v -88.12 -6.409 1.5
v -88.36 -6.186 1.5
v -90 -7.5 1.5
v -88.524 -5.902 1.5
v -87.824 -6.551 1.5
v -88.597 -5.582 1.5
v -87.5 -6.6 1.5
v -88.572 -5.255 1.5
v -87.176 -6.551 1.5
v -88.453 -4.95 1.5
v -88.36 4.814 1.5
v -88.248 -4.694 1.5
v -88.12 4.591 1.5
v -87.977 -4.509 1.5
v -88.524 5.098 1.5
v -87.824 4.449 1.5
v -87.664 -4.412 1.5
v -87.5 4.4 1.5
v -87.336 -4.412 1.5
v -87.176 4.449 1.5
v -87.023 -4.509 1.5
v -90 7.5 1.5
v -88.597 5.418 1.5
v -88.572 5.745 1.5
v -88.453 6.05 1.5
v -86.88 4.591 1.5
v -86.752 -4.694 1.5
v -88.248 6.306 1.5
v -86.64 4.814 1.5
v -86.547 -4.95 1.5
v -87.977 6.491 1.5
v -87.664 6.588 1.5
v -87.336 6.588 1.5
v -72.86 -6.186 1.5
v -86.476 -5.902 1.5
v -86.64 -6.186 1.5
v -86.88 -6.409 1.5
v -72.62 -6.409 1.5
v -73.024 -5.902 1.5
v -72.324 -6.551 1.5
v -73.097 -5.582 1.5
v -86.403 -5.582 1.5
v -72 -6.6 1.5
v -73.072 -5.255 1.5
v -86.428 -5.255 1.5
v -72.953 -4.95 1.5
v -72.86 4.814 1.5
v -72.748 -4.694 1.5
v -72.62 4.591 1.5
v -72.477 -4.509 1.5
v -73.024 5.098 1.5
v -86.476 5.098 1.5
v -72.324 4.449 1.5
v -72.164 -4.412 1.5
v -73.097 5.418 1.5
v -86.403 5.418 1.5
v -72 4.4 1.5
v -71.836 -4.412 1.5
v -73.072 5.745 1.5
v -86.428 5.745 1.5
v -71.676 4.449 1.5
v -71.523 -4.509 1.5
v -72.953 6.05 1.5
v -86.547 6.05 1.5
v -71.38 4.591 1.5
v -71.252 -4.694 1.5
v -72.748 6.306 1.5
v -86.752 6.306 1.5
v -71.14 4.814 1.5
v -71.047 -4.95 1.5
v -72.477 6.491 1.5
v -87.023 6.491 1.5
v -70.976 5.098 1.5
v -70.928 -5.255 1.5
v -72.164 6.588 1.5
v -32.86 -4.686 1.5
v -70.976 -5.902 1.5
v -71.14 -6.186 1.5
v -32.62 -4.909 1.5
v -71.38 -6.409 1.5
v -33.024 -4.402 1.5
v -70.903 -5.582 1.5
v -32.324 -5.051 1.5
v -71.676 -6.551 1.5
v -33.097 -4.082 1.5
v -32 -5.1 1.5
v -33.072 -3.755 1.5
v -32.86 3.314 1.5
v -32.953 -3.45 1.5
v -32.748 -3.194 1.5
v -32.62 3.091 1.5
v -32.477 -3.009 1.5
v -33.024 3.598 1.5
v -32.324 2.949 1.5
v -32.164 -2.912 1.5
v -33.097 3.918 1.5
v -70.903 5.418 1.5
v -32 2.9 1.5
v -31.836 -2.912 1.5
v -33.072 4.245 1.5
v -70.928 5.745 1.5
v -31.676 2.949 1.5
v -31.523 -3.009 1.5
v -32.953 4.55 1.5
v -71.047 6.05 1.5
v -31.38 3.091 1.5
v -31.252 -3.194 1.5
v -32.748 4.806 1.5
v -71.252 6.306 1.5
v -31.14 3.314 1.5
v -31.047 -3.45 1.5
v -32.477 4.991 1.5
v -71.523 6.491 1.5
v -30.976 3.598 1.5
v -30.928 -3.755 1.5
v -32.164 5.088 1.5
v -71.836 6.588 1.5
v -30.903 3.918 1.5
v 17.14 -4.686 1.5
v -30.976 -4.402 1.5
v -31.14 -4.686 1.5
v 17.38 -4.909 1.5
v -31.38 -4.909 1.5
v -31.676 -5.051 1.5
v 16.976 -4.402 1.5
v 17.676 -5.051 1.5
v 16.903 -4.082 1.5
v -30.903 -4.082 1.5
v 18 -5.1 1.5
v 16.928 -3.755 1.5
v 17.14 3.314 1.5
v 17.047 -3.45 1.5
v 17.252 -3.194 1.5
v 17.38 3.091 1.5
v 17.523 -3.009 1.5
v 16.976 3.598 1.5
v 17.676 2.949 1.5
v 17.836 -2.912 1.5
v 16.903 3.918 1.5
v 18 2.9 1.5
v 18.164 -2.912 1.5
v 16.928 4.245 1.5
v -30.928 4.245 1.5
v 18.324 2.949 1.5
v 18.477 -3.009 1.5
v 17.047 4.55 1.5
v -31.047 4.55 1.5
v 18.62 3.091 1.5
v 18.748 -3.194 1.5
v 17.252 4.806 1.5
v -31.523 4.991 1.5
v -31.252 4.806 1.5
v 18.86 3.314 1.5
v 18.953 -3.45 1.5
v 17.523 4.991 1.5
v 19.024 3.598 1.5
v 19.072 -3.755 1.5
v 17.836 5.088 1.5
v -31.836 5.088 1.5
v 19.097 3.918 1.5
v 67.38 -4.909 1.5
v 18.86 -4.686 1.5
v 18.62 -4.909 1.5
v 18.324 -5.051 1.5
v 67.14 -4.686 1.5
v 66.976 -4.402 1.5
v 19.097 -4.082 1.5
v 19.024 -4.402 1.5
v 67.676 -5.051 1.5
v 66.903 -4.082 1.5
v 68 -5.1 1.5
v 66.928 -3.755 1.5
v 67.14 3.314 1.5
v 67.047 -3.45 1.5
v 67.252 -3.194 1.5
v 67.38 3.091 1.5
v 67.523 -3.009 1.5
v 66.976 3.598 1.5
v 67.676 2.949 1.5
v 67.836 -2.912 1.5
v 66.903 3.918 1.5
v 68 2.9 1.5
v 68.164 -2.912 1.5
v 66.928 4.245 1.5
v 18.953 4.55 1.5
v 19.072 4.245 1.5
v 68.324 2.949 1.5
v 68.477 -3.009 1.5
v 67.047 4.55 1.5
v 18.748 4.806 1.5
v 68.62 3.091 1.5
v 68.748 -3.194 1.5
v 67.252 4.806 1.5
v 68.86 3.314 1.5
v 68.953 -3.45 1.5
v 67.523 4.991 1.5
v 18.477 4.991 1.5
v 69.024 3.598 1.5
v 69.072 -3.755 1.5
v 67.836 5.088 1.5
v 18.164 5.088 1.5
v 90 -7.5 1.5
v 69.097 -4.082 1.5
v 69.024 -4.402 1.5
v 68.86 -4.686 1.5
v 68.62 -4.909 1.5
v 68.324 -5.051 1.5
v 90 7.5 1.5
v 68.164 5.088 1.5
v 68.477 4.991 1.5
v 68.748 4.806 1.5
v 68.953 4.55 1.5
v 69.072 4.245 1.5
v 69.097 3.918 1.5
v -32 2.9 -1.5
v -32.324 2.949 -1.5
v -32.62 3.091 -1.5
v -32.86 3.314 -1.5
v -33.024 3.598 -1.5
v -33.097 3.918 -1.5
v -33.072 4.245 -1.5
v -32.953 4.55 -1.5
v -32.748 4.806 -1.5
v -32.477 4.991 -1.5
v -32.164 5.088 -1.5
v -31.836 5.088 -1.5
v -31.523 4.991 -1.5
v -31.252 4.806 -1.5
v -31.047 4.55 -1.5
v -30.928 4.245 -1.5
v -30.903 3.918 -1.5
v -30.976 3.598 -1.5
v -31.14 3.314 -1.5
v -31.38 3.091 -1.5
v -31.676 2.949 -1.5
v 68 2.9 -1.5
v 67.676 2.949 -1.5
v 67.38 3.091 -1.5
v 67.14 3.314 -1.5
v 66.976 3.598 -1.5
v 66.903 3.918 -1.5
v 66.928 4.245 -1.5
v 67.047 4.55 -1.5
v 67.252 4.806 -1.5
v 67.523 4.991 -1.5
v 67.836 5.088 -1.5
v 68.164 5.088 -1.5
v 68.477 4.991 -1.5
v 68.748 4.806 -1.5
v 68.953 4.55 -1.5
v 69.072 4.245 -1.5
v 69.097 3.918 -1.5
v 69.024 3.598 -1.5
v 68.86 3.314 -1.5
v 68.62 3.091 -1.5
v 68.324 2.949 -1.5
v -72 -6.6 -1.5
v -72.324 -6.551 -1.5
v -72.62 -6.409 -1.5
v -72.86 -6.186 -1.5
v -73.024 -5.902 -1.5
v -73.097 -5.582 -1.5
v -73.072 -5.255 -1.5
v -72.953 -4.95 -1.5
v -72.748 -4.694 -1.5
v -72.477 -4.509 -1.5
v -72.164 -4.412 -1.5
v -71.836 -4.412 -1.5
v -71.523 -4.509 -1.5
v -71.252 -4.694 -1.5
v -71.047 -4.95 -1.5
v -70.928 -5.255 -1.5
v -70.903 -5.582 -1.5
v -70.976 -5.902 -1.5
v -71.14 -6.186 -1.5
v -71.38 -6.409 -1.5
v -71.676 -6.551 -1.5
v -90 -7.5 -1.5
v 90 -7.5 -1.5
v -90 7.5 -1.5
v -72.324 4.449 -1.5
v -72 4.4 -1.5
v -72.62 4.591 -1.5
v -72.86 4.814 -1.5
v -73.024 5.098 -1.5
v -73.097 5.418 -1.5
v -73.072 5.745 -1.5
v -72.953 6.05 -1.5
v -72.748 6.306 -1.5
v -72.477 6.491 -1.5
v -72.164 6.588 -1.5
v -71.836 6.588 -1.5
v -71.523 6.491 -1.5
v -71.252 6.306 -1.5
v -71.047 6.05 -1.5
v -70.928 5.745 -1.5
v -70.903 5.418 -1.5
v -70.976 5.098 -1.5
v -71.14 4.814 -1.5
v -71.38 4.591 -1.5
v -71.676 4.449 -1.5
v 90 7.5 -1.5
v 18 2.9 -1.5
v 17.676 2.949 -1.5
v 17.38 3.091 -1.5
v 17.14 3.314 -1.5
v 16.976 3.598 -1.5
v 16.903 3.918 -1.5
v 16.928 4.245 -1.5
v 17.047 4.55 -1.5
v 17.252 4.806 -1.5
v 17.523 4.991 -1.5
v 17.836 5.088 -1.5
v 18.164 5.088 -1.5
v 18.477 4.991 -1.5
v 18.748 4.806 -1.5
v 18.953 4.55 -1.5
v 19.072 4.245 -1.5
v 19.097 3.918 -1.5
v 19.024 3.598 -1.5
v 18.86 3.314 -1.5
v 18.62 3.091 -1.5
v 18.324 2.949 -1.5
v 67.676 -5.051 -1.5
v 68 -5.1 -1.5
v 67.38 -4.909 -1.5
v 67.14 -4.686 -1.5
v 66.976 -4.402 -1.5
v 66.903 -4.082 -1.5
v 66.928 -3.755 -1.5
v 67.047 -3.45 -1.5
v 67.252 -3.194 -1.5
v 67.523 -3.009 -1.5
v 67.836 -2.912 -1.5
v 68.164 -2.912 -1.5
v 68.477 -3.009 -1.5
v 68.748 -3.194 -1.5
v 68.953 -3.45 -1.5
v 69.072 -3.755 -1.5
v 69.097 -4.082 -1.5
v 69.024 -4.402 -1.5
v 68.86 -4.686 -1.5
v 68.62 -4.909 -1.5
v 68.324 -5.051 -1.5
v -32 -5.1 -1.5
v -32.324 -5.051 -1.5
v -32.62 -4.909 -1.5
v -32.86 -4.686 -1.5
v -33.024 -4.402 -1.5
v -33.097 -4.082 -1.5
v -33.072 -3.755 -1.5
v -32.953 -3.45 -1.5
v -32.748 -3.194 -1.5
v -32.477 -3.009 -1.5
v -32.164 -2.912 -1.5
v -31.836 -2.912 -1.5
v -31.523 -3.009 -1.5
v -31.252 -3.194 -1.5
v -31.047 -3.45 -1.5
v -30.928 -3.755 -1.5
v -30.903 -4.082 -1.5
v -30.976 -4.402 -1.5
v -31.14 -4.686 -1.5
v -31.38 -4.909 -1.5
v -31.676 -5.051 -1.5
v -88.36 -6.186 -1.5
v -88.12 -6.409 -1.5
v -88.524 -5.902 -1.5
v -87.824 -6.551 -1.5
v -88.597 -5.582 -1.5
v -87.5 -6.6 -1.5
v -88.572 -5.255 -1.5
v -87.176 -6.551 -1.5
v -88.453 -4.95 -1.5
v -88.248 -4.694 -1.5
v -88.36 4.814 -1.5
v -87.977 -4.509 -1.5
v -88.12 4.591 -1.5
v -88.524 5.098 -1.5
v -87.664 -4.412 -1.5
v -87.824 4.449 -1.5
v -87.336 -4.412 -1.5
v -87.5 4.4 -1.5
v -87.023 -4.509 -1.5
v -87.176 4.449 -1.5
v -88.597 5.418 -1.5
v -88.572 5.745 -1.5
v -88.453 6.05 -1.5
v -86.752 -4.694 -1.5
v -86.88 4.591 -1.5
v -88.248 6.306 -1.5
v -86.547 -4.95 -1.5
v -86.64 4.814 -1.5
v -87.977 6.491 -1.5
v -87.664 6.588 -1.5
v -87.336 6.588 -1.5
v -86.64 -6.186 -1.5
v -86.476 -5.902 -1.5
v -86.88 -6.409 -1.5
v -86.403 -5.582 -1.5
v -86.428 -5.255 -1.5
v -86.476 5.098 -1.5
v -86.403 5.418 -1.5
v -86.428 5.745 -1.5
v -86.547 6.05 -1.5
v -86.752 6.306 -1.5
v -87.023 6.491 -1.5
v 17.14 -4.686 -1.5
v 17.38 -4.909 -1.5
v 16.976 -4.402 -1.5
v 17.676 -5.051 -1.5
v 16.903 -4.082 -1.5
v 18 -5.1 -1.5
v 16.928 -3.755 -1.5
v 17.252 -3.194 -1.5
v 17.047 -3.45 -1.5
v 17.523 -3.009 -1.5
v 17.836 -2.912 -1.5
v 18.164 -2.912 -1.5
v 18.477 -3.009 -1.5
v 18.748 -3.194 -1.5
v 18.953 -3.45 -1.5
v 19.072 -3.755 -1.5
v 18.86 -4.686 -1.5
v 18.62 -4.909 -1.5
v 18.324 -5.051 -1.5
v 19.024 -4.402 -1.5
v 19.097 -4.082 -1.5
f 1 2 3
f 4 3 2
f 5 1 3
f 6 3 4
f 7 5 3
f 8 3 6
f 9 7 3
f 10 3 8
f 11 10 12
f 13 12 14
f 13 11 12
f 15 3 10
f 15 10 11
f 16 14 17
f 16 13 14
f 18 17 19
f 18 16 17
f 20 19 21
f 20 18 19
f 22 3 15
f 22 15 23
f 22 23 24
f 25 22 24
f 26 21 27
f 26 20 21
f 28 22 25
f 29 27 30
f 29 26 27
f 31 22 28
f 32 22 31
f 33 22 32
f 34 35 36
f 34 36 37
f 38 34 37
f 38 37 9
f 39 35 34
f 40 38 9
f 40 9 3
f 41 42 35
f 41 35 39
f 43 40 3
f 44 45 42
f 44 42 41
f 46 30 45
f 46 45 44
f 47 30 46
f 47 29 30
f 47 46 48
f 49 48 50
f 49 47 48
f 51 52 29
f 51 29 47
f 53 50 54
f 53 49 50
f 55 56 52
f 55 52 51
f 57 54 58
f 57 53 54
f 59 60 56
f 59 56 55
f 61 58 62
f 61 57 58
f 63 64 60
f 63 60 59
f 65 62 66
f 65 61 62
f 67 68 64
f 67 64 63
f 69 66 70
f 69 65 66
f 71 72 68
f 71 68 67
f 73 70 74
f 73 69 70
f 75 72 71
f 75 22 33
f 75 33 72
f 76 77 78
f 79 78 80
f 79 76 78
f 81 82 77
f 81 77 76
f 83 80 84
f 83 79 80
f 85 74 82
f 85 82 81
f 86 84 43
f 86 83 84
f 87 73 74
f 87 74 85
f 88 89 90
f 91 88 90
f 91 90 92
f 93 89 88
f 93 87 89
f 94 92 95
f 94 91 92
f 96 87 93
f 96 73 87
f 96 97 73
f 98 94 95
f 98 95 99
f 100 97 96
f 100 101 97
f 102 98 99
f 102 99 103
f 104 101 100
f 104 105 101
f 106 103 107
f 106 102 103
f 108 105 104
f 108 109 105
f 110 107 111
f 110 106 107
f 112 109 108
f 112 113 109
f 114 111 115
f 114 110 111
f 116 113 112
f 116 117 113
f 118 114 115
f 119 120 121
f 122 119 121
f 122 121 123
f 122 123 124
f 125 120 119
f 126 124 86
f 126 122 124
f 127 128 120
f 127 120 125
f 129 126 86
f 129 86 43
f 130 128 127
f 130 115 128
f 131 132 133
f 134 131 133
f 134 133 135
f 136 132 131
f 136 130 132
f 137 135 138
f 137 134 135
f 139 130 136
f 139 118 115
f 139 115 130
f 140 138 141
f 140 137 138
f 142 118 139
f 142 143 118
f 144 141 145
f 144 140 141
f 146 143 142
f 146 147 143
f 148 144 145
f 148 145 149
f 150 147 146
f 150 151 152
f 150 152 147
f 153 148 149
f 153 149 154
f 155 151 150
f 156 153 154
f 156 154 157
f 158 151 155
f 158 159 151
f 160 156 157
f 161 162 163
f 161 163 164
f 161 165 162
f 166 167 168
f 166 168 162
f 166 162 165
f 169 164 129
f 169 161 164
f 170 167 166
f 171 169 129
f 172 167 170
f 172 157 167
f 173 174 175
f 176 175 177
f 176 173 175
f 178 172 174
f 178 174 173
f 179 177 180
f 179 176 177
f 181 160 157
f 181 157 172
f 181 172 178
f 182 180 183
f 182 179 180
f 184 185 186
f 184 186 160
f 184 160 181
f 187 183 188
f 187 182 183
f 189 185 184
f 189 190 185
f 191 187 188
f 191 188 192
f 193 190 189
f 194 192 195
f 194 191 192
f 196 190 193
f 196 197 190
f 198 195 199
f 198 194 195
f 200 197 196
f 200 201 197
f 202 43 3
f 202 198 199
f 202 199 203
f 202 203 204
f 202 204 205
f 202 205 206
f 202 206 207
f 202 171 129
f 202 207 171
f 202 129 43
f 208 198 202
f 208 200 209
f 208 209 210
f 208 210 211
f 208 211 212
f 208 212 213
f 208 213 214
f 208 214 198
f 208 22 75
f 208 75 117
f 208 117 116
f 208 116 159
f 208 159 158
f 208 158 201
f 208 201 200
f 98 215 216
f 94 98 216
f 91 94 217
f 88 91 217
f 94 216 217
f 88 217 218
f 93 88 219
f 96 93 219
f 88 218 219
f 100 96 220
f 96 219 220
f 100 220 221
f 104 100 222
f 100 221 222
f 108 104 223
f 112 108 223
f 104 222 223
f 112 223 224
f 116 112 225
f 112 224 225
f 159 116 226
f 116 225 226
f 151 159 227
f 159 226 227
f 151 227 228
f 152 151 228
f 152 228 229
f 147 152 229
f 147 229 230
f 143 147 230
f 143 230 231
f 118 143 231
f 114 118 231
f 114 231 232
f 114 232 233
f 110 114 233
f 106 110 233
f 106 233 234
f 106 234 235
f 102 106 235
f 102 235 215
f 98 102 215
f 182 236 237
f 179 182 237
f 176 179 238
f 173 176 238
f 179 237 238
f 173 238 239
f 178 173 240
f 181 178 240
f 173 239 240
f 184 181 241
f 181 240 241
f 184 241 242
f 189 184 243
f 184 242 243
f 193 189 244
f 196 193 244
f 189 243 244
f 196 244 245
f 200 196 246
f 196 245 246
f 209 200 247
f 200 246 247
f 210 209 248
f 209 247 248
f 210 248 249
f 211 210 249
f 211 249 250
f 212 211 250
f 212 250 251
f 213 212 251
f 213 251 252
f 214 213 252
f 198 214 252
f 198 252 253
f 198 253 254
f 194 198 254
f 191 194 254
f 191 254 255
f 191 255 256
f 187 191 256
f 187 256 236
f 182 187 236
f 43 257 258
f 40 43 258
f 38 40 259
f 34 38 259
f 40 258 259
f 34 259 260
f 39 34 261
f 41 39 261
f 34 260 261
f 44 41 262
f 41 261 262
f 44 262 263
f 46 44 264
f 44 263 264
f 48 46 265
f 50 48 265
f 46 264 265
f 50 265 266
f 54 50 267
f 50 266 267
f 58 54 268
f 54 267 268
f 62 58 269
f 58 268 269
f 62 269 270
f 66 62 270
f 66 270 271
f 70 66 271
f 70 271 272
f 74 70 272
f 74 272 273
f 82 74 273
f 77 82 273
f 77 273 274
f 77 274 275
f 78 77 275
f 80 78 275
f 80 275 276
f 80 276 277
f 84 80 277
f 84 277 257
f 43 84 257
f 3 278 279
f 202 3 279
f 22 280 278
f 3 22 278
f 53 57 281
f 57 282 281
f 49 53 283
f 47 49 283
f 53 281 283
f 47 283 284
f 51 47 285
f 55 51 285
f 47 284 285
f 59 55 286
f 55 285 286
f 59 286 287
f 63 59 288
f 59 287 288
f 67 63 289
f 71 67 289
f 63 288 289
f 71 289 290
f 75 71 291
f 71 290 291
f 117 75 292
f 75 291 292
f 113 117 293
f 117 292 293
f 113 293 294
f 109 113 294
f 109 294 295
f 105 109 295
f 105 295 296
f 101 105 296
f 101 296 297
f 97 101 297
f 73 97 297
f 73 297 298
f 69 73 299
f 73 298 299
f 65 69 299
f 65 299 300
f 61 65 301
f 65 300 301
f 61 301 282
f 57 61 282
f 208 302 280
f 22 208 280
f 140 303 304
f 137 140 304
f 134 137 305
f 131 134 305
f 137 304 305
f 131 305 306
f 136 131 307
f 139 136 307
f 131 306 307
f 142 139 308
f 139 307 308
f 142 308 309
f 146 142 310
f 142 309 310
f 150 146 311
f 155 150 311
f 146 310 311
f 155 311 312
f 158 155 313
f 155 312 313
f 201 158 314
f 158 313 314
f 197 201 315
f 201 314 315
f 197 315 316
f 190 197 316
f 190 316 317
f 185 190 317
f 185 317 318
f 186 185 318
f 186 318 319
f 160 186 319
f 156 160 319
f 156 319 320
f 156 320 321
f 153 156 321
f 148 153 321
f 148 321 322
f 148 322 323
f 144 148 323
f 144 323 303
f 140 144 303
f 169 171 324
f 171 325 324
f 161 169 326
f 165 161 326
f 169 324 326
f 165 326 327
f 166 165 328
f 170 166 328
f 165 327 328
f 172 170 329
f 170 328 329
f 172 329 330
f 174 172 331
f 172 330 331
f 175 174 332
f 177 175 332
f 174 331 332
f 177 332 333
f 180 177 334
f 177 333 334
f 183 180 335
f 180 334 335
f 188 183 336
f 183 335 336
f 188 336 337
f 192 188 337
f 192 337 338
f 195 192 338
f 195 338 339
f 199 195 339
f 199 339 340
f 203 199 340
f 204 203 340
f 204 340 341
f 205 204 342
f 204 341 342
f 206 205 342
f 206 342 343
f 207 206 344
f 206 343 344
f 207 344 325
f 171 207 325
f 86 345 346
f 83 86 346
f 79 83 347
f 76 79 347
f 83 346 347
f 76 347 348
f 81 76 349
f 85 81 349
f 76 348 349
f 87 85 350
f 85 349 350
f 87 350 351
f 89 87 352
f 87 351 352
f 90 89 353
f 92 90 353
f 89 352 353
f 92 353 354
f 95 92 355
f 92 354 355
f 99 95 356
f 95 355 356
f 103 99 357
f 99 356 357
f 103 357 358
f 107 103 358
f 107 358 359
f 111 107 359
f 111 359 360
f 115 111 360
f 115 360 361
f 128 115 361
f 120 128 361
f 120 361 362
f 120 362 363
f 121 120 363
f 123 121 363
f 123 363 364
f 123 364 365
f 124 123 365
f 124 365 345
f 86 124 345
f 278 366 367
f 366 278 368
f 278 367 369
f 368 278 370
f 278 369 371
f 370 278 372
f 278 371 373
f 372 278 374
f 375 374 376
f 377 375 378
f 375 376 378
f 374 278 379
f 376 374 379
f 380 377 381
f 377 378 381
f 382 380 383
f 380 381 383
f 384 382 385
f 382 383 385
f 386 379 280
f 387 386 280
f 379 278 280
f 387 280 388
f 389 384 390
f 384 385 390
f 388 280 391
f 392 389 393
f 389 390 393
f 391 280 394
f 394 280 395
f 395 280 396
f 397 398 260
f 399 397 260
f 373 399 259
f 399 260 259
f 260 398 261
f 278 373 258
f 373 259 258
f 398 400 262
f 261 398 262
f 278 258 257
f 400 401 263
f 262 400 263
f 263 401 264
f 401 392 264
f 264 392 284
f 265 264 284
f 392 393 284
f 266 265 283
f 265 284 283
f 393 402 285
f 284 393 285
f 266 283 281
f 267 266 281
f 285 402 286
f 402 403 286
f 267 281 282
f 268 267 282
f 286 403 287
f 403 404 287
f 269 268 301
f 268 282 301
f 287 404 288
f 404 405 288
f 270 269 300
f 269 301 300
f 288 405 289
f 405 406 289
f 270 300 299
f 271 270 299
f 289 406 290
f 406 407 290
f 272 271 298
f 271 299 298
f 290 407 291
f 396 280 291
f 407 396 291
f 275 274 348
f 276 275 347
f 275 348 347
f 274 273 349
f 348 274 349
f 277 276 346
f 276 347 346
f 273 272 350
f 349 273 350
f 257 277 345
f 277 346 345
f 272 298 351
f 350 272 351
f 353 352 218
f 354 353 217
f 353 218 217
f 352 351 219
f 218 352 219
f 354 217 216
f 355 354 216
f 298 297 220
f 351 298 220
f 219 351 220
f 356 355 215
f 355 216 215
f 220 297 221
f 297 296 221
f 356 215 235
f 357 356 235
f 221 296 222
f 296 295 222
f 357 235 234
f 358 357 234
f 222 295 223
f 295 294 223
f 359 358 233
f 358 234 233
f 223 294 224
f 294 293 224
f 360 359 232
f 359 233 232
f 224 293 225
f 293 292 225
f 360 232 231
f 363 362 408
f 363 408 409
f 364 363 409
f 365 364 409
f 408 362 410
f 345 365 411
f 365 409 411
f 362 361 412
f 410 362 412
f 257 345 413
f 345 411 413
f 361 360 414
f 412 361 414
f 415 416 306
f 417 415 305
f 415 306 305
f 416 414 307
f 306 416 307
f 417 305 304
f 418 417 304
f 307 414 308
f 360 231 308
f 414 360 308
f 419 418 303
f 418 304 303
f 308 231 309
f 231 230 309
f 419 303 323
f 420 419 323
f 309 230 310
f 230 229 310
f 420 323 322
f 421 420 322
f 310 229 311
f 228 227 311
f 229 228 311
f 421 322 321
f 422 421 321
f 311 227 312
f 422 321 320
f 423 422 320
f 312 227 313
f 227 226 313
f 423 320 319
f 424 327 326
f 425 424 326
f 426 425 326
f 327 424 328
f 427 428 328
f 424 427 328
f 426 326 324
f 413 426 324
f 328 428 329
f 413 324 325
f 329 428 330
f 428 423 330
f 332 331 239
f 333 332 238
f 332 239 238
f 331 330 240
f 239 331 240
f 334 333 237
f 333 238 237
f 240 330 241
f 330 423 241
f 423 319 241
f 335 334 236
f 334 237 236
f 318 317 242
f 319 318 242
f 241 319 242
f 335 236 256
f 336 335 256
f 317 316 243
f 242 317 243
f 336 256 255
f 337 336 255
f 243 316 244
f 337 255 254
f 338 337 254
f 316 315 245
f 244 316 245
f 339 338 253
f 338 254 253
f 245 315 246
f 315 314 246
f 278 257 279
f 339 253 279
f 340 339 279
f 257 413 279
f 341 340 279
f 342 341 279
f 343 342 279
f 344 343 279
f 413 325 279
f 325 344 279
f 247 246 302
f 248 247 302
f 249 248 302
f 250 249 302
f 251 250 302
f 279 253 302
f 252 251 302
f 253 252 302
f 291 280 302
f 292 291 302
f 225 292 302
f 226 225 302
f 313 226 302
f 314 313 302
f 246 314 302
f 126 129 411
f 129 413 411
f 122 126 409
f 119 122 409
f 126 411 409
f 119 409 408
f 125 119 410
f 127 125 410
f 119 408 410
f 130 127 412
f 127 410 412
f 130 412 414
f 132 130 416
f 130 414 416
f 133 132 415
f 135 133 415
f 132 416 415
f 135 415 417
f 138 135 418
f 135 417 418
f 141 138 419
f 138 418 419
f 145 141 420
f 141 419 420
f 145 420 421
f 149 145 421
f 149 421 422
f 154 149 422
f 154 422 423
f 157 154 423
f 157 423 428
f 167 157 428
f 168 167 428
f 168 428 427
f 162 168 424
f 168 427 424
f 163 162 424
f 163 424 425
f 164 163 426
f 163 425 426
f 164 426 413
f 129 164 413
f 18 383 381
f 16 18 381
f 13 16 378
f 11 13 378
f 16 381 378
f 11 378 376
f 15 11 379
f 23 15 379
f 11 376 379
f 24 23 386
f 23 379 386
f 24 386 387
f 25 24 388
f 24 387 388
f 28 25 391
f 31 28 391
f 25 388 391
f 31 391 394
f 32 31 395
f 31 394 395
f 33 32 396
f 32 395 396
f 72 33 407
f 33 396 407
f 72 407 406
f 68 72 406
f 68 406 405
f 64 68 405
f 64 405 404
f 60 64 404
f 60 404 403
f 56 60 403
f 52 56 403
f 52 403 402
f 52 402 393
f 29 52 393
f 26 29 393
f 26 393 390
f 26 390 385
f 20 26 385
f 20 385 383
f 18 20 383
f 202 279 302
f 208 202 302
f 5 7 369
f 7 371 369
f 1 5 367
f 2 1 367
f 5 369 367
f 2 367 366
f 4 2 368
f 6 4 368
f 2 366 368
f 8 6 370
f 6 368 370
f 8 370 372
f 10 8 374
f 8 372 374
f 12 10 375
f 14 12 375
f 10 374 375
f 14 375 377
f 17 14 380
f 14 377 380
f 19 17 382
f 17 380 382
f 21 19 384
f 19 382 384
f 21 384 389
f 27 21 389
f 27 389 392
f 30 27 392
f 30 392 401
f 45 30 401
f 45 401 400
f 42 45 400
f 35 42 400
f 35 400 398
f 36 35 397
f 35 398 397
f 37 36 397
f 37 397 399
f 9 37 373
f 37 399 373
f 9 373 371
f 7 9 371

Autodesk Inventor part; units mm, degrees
ref_plane "YZ Plane" through (0, 0, 0) normal (1, 0, 0) x (0, 1, 0)
ref_plane "XZ Plane" through (0, 0, 0) normal (0, 1, 0) x (-1, 0, 0)
ref_plane "XY Plane" through (0, 0, 0) normal (0, 0, 1) x (1, 0, 0)
sketch "スケッチ1" plane through (0, 0, 0) normal (0, 0, 1) x (1, 0, 0)
  line L0 (-90, -7.5) -> (90, -7.5)
  line L1 (90, -7.5) -> (90, 7.5)
  line L2 (90, 7.5) -> (-90, 7.5)
  line L3 (-90, 7.5) -> (-90, -7.5)
  line L4 (-90, -7.5) -> (90, 7.5) construction
  line L5 (90, -7.5) -> (-90, 7.5) construction
  point P0 (0, 0)
  dimension "d0" = 180
  dimension "d1" = 15
extrude "押し出し1" add sketch "スケッチ1" along normal mid plane 3
sketch "スケッチ2" plane through (0, 0, 1.5) normal (0, 0, 1) x (1, 0, 0)
  line L0 (-90, 7.5) -> (-90, -7.5) projected
  line L1 (0, 0) -> (-7.3146, 0)
  point P0 (-87.5, 5.5)
  point P1 (-72, 5.5)
  point P2 (-87.5, -5.5)
  point P3 (-72, -5.5)
  dimension "d4" = 2.5
  dimension "d5" = 15.5
  dimension "d6" = 5.5
  dimension "d7" = 5.5
hole "穴1" at (-87.5, 5.5, 1.5) at (-72, 5.5, 1.5) at (-87.5, -5.5, 1.5) at (-72, -5.5, 1.5) direction (0, 0, -1) diameter 2.2 end through all
sketch "スケッチ3" plane through (0, 0, 1.5) normal (0, 0, 1) x (1, 0, 0)
  circle A0 centre (-72, 5.5) radius 1.1 projected
  circle A1 centre (-72, -5.5) radius 1.1 projected
  circle A2 centre (-72, -5.5) radius 1.1 projected
  circle A3 centre (-87.5, -5.5) radius 1.1 projected
  circle A4 centre (-72, 5.5) radius 1.1 projected
  circle A5 centre (-87.5, 5.5) radius 1.1 projected
  line L0 (90, -7.5) -> (90, 7.5) projected
  line L1 (90, 7.5) -> (-90, 7.5) projected
  line L2 (-90, 7.5) -> (-90, -7.5) projected
  line L3 (-90, -7.5) -> (90, -7.5) projected
  point P0 (0, 0)
  point P1 (-32, 4)
  point P2 (-32, -4)
  point P3 (18, 4)
  point P4 (18, -4)
  point P5 (68, 4)
  point P6 (68, -4)
  dimension "d15" = 40
  dimension "d16" = 4
  dimension "d17" = 4
  dimension "d18" = 40
  dimension "d28" = 50
hole "穴2" at (-32, 4, 1.5) at (-32, -4, 1.5) at (18, 4, 1.5) at (18, -4, 1.5) at (68, 4, 1.5) at (68, -4, 1.5) direction (0, 0, -1) diameter 2.2 end through all
equation "\"d7\" = d6"
equation "\"d17\" = d16"
properties part number "slider_to_cutter_part"
